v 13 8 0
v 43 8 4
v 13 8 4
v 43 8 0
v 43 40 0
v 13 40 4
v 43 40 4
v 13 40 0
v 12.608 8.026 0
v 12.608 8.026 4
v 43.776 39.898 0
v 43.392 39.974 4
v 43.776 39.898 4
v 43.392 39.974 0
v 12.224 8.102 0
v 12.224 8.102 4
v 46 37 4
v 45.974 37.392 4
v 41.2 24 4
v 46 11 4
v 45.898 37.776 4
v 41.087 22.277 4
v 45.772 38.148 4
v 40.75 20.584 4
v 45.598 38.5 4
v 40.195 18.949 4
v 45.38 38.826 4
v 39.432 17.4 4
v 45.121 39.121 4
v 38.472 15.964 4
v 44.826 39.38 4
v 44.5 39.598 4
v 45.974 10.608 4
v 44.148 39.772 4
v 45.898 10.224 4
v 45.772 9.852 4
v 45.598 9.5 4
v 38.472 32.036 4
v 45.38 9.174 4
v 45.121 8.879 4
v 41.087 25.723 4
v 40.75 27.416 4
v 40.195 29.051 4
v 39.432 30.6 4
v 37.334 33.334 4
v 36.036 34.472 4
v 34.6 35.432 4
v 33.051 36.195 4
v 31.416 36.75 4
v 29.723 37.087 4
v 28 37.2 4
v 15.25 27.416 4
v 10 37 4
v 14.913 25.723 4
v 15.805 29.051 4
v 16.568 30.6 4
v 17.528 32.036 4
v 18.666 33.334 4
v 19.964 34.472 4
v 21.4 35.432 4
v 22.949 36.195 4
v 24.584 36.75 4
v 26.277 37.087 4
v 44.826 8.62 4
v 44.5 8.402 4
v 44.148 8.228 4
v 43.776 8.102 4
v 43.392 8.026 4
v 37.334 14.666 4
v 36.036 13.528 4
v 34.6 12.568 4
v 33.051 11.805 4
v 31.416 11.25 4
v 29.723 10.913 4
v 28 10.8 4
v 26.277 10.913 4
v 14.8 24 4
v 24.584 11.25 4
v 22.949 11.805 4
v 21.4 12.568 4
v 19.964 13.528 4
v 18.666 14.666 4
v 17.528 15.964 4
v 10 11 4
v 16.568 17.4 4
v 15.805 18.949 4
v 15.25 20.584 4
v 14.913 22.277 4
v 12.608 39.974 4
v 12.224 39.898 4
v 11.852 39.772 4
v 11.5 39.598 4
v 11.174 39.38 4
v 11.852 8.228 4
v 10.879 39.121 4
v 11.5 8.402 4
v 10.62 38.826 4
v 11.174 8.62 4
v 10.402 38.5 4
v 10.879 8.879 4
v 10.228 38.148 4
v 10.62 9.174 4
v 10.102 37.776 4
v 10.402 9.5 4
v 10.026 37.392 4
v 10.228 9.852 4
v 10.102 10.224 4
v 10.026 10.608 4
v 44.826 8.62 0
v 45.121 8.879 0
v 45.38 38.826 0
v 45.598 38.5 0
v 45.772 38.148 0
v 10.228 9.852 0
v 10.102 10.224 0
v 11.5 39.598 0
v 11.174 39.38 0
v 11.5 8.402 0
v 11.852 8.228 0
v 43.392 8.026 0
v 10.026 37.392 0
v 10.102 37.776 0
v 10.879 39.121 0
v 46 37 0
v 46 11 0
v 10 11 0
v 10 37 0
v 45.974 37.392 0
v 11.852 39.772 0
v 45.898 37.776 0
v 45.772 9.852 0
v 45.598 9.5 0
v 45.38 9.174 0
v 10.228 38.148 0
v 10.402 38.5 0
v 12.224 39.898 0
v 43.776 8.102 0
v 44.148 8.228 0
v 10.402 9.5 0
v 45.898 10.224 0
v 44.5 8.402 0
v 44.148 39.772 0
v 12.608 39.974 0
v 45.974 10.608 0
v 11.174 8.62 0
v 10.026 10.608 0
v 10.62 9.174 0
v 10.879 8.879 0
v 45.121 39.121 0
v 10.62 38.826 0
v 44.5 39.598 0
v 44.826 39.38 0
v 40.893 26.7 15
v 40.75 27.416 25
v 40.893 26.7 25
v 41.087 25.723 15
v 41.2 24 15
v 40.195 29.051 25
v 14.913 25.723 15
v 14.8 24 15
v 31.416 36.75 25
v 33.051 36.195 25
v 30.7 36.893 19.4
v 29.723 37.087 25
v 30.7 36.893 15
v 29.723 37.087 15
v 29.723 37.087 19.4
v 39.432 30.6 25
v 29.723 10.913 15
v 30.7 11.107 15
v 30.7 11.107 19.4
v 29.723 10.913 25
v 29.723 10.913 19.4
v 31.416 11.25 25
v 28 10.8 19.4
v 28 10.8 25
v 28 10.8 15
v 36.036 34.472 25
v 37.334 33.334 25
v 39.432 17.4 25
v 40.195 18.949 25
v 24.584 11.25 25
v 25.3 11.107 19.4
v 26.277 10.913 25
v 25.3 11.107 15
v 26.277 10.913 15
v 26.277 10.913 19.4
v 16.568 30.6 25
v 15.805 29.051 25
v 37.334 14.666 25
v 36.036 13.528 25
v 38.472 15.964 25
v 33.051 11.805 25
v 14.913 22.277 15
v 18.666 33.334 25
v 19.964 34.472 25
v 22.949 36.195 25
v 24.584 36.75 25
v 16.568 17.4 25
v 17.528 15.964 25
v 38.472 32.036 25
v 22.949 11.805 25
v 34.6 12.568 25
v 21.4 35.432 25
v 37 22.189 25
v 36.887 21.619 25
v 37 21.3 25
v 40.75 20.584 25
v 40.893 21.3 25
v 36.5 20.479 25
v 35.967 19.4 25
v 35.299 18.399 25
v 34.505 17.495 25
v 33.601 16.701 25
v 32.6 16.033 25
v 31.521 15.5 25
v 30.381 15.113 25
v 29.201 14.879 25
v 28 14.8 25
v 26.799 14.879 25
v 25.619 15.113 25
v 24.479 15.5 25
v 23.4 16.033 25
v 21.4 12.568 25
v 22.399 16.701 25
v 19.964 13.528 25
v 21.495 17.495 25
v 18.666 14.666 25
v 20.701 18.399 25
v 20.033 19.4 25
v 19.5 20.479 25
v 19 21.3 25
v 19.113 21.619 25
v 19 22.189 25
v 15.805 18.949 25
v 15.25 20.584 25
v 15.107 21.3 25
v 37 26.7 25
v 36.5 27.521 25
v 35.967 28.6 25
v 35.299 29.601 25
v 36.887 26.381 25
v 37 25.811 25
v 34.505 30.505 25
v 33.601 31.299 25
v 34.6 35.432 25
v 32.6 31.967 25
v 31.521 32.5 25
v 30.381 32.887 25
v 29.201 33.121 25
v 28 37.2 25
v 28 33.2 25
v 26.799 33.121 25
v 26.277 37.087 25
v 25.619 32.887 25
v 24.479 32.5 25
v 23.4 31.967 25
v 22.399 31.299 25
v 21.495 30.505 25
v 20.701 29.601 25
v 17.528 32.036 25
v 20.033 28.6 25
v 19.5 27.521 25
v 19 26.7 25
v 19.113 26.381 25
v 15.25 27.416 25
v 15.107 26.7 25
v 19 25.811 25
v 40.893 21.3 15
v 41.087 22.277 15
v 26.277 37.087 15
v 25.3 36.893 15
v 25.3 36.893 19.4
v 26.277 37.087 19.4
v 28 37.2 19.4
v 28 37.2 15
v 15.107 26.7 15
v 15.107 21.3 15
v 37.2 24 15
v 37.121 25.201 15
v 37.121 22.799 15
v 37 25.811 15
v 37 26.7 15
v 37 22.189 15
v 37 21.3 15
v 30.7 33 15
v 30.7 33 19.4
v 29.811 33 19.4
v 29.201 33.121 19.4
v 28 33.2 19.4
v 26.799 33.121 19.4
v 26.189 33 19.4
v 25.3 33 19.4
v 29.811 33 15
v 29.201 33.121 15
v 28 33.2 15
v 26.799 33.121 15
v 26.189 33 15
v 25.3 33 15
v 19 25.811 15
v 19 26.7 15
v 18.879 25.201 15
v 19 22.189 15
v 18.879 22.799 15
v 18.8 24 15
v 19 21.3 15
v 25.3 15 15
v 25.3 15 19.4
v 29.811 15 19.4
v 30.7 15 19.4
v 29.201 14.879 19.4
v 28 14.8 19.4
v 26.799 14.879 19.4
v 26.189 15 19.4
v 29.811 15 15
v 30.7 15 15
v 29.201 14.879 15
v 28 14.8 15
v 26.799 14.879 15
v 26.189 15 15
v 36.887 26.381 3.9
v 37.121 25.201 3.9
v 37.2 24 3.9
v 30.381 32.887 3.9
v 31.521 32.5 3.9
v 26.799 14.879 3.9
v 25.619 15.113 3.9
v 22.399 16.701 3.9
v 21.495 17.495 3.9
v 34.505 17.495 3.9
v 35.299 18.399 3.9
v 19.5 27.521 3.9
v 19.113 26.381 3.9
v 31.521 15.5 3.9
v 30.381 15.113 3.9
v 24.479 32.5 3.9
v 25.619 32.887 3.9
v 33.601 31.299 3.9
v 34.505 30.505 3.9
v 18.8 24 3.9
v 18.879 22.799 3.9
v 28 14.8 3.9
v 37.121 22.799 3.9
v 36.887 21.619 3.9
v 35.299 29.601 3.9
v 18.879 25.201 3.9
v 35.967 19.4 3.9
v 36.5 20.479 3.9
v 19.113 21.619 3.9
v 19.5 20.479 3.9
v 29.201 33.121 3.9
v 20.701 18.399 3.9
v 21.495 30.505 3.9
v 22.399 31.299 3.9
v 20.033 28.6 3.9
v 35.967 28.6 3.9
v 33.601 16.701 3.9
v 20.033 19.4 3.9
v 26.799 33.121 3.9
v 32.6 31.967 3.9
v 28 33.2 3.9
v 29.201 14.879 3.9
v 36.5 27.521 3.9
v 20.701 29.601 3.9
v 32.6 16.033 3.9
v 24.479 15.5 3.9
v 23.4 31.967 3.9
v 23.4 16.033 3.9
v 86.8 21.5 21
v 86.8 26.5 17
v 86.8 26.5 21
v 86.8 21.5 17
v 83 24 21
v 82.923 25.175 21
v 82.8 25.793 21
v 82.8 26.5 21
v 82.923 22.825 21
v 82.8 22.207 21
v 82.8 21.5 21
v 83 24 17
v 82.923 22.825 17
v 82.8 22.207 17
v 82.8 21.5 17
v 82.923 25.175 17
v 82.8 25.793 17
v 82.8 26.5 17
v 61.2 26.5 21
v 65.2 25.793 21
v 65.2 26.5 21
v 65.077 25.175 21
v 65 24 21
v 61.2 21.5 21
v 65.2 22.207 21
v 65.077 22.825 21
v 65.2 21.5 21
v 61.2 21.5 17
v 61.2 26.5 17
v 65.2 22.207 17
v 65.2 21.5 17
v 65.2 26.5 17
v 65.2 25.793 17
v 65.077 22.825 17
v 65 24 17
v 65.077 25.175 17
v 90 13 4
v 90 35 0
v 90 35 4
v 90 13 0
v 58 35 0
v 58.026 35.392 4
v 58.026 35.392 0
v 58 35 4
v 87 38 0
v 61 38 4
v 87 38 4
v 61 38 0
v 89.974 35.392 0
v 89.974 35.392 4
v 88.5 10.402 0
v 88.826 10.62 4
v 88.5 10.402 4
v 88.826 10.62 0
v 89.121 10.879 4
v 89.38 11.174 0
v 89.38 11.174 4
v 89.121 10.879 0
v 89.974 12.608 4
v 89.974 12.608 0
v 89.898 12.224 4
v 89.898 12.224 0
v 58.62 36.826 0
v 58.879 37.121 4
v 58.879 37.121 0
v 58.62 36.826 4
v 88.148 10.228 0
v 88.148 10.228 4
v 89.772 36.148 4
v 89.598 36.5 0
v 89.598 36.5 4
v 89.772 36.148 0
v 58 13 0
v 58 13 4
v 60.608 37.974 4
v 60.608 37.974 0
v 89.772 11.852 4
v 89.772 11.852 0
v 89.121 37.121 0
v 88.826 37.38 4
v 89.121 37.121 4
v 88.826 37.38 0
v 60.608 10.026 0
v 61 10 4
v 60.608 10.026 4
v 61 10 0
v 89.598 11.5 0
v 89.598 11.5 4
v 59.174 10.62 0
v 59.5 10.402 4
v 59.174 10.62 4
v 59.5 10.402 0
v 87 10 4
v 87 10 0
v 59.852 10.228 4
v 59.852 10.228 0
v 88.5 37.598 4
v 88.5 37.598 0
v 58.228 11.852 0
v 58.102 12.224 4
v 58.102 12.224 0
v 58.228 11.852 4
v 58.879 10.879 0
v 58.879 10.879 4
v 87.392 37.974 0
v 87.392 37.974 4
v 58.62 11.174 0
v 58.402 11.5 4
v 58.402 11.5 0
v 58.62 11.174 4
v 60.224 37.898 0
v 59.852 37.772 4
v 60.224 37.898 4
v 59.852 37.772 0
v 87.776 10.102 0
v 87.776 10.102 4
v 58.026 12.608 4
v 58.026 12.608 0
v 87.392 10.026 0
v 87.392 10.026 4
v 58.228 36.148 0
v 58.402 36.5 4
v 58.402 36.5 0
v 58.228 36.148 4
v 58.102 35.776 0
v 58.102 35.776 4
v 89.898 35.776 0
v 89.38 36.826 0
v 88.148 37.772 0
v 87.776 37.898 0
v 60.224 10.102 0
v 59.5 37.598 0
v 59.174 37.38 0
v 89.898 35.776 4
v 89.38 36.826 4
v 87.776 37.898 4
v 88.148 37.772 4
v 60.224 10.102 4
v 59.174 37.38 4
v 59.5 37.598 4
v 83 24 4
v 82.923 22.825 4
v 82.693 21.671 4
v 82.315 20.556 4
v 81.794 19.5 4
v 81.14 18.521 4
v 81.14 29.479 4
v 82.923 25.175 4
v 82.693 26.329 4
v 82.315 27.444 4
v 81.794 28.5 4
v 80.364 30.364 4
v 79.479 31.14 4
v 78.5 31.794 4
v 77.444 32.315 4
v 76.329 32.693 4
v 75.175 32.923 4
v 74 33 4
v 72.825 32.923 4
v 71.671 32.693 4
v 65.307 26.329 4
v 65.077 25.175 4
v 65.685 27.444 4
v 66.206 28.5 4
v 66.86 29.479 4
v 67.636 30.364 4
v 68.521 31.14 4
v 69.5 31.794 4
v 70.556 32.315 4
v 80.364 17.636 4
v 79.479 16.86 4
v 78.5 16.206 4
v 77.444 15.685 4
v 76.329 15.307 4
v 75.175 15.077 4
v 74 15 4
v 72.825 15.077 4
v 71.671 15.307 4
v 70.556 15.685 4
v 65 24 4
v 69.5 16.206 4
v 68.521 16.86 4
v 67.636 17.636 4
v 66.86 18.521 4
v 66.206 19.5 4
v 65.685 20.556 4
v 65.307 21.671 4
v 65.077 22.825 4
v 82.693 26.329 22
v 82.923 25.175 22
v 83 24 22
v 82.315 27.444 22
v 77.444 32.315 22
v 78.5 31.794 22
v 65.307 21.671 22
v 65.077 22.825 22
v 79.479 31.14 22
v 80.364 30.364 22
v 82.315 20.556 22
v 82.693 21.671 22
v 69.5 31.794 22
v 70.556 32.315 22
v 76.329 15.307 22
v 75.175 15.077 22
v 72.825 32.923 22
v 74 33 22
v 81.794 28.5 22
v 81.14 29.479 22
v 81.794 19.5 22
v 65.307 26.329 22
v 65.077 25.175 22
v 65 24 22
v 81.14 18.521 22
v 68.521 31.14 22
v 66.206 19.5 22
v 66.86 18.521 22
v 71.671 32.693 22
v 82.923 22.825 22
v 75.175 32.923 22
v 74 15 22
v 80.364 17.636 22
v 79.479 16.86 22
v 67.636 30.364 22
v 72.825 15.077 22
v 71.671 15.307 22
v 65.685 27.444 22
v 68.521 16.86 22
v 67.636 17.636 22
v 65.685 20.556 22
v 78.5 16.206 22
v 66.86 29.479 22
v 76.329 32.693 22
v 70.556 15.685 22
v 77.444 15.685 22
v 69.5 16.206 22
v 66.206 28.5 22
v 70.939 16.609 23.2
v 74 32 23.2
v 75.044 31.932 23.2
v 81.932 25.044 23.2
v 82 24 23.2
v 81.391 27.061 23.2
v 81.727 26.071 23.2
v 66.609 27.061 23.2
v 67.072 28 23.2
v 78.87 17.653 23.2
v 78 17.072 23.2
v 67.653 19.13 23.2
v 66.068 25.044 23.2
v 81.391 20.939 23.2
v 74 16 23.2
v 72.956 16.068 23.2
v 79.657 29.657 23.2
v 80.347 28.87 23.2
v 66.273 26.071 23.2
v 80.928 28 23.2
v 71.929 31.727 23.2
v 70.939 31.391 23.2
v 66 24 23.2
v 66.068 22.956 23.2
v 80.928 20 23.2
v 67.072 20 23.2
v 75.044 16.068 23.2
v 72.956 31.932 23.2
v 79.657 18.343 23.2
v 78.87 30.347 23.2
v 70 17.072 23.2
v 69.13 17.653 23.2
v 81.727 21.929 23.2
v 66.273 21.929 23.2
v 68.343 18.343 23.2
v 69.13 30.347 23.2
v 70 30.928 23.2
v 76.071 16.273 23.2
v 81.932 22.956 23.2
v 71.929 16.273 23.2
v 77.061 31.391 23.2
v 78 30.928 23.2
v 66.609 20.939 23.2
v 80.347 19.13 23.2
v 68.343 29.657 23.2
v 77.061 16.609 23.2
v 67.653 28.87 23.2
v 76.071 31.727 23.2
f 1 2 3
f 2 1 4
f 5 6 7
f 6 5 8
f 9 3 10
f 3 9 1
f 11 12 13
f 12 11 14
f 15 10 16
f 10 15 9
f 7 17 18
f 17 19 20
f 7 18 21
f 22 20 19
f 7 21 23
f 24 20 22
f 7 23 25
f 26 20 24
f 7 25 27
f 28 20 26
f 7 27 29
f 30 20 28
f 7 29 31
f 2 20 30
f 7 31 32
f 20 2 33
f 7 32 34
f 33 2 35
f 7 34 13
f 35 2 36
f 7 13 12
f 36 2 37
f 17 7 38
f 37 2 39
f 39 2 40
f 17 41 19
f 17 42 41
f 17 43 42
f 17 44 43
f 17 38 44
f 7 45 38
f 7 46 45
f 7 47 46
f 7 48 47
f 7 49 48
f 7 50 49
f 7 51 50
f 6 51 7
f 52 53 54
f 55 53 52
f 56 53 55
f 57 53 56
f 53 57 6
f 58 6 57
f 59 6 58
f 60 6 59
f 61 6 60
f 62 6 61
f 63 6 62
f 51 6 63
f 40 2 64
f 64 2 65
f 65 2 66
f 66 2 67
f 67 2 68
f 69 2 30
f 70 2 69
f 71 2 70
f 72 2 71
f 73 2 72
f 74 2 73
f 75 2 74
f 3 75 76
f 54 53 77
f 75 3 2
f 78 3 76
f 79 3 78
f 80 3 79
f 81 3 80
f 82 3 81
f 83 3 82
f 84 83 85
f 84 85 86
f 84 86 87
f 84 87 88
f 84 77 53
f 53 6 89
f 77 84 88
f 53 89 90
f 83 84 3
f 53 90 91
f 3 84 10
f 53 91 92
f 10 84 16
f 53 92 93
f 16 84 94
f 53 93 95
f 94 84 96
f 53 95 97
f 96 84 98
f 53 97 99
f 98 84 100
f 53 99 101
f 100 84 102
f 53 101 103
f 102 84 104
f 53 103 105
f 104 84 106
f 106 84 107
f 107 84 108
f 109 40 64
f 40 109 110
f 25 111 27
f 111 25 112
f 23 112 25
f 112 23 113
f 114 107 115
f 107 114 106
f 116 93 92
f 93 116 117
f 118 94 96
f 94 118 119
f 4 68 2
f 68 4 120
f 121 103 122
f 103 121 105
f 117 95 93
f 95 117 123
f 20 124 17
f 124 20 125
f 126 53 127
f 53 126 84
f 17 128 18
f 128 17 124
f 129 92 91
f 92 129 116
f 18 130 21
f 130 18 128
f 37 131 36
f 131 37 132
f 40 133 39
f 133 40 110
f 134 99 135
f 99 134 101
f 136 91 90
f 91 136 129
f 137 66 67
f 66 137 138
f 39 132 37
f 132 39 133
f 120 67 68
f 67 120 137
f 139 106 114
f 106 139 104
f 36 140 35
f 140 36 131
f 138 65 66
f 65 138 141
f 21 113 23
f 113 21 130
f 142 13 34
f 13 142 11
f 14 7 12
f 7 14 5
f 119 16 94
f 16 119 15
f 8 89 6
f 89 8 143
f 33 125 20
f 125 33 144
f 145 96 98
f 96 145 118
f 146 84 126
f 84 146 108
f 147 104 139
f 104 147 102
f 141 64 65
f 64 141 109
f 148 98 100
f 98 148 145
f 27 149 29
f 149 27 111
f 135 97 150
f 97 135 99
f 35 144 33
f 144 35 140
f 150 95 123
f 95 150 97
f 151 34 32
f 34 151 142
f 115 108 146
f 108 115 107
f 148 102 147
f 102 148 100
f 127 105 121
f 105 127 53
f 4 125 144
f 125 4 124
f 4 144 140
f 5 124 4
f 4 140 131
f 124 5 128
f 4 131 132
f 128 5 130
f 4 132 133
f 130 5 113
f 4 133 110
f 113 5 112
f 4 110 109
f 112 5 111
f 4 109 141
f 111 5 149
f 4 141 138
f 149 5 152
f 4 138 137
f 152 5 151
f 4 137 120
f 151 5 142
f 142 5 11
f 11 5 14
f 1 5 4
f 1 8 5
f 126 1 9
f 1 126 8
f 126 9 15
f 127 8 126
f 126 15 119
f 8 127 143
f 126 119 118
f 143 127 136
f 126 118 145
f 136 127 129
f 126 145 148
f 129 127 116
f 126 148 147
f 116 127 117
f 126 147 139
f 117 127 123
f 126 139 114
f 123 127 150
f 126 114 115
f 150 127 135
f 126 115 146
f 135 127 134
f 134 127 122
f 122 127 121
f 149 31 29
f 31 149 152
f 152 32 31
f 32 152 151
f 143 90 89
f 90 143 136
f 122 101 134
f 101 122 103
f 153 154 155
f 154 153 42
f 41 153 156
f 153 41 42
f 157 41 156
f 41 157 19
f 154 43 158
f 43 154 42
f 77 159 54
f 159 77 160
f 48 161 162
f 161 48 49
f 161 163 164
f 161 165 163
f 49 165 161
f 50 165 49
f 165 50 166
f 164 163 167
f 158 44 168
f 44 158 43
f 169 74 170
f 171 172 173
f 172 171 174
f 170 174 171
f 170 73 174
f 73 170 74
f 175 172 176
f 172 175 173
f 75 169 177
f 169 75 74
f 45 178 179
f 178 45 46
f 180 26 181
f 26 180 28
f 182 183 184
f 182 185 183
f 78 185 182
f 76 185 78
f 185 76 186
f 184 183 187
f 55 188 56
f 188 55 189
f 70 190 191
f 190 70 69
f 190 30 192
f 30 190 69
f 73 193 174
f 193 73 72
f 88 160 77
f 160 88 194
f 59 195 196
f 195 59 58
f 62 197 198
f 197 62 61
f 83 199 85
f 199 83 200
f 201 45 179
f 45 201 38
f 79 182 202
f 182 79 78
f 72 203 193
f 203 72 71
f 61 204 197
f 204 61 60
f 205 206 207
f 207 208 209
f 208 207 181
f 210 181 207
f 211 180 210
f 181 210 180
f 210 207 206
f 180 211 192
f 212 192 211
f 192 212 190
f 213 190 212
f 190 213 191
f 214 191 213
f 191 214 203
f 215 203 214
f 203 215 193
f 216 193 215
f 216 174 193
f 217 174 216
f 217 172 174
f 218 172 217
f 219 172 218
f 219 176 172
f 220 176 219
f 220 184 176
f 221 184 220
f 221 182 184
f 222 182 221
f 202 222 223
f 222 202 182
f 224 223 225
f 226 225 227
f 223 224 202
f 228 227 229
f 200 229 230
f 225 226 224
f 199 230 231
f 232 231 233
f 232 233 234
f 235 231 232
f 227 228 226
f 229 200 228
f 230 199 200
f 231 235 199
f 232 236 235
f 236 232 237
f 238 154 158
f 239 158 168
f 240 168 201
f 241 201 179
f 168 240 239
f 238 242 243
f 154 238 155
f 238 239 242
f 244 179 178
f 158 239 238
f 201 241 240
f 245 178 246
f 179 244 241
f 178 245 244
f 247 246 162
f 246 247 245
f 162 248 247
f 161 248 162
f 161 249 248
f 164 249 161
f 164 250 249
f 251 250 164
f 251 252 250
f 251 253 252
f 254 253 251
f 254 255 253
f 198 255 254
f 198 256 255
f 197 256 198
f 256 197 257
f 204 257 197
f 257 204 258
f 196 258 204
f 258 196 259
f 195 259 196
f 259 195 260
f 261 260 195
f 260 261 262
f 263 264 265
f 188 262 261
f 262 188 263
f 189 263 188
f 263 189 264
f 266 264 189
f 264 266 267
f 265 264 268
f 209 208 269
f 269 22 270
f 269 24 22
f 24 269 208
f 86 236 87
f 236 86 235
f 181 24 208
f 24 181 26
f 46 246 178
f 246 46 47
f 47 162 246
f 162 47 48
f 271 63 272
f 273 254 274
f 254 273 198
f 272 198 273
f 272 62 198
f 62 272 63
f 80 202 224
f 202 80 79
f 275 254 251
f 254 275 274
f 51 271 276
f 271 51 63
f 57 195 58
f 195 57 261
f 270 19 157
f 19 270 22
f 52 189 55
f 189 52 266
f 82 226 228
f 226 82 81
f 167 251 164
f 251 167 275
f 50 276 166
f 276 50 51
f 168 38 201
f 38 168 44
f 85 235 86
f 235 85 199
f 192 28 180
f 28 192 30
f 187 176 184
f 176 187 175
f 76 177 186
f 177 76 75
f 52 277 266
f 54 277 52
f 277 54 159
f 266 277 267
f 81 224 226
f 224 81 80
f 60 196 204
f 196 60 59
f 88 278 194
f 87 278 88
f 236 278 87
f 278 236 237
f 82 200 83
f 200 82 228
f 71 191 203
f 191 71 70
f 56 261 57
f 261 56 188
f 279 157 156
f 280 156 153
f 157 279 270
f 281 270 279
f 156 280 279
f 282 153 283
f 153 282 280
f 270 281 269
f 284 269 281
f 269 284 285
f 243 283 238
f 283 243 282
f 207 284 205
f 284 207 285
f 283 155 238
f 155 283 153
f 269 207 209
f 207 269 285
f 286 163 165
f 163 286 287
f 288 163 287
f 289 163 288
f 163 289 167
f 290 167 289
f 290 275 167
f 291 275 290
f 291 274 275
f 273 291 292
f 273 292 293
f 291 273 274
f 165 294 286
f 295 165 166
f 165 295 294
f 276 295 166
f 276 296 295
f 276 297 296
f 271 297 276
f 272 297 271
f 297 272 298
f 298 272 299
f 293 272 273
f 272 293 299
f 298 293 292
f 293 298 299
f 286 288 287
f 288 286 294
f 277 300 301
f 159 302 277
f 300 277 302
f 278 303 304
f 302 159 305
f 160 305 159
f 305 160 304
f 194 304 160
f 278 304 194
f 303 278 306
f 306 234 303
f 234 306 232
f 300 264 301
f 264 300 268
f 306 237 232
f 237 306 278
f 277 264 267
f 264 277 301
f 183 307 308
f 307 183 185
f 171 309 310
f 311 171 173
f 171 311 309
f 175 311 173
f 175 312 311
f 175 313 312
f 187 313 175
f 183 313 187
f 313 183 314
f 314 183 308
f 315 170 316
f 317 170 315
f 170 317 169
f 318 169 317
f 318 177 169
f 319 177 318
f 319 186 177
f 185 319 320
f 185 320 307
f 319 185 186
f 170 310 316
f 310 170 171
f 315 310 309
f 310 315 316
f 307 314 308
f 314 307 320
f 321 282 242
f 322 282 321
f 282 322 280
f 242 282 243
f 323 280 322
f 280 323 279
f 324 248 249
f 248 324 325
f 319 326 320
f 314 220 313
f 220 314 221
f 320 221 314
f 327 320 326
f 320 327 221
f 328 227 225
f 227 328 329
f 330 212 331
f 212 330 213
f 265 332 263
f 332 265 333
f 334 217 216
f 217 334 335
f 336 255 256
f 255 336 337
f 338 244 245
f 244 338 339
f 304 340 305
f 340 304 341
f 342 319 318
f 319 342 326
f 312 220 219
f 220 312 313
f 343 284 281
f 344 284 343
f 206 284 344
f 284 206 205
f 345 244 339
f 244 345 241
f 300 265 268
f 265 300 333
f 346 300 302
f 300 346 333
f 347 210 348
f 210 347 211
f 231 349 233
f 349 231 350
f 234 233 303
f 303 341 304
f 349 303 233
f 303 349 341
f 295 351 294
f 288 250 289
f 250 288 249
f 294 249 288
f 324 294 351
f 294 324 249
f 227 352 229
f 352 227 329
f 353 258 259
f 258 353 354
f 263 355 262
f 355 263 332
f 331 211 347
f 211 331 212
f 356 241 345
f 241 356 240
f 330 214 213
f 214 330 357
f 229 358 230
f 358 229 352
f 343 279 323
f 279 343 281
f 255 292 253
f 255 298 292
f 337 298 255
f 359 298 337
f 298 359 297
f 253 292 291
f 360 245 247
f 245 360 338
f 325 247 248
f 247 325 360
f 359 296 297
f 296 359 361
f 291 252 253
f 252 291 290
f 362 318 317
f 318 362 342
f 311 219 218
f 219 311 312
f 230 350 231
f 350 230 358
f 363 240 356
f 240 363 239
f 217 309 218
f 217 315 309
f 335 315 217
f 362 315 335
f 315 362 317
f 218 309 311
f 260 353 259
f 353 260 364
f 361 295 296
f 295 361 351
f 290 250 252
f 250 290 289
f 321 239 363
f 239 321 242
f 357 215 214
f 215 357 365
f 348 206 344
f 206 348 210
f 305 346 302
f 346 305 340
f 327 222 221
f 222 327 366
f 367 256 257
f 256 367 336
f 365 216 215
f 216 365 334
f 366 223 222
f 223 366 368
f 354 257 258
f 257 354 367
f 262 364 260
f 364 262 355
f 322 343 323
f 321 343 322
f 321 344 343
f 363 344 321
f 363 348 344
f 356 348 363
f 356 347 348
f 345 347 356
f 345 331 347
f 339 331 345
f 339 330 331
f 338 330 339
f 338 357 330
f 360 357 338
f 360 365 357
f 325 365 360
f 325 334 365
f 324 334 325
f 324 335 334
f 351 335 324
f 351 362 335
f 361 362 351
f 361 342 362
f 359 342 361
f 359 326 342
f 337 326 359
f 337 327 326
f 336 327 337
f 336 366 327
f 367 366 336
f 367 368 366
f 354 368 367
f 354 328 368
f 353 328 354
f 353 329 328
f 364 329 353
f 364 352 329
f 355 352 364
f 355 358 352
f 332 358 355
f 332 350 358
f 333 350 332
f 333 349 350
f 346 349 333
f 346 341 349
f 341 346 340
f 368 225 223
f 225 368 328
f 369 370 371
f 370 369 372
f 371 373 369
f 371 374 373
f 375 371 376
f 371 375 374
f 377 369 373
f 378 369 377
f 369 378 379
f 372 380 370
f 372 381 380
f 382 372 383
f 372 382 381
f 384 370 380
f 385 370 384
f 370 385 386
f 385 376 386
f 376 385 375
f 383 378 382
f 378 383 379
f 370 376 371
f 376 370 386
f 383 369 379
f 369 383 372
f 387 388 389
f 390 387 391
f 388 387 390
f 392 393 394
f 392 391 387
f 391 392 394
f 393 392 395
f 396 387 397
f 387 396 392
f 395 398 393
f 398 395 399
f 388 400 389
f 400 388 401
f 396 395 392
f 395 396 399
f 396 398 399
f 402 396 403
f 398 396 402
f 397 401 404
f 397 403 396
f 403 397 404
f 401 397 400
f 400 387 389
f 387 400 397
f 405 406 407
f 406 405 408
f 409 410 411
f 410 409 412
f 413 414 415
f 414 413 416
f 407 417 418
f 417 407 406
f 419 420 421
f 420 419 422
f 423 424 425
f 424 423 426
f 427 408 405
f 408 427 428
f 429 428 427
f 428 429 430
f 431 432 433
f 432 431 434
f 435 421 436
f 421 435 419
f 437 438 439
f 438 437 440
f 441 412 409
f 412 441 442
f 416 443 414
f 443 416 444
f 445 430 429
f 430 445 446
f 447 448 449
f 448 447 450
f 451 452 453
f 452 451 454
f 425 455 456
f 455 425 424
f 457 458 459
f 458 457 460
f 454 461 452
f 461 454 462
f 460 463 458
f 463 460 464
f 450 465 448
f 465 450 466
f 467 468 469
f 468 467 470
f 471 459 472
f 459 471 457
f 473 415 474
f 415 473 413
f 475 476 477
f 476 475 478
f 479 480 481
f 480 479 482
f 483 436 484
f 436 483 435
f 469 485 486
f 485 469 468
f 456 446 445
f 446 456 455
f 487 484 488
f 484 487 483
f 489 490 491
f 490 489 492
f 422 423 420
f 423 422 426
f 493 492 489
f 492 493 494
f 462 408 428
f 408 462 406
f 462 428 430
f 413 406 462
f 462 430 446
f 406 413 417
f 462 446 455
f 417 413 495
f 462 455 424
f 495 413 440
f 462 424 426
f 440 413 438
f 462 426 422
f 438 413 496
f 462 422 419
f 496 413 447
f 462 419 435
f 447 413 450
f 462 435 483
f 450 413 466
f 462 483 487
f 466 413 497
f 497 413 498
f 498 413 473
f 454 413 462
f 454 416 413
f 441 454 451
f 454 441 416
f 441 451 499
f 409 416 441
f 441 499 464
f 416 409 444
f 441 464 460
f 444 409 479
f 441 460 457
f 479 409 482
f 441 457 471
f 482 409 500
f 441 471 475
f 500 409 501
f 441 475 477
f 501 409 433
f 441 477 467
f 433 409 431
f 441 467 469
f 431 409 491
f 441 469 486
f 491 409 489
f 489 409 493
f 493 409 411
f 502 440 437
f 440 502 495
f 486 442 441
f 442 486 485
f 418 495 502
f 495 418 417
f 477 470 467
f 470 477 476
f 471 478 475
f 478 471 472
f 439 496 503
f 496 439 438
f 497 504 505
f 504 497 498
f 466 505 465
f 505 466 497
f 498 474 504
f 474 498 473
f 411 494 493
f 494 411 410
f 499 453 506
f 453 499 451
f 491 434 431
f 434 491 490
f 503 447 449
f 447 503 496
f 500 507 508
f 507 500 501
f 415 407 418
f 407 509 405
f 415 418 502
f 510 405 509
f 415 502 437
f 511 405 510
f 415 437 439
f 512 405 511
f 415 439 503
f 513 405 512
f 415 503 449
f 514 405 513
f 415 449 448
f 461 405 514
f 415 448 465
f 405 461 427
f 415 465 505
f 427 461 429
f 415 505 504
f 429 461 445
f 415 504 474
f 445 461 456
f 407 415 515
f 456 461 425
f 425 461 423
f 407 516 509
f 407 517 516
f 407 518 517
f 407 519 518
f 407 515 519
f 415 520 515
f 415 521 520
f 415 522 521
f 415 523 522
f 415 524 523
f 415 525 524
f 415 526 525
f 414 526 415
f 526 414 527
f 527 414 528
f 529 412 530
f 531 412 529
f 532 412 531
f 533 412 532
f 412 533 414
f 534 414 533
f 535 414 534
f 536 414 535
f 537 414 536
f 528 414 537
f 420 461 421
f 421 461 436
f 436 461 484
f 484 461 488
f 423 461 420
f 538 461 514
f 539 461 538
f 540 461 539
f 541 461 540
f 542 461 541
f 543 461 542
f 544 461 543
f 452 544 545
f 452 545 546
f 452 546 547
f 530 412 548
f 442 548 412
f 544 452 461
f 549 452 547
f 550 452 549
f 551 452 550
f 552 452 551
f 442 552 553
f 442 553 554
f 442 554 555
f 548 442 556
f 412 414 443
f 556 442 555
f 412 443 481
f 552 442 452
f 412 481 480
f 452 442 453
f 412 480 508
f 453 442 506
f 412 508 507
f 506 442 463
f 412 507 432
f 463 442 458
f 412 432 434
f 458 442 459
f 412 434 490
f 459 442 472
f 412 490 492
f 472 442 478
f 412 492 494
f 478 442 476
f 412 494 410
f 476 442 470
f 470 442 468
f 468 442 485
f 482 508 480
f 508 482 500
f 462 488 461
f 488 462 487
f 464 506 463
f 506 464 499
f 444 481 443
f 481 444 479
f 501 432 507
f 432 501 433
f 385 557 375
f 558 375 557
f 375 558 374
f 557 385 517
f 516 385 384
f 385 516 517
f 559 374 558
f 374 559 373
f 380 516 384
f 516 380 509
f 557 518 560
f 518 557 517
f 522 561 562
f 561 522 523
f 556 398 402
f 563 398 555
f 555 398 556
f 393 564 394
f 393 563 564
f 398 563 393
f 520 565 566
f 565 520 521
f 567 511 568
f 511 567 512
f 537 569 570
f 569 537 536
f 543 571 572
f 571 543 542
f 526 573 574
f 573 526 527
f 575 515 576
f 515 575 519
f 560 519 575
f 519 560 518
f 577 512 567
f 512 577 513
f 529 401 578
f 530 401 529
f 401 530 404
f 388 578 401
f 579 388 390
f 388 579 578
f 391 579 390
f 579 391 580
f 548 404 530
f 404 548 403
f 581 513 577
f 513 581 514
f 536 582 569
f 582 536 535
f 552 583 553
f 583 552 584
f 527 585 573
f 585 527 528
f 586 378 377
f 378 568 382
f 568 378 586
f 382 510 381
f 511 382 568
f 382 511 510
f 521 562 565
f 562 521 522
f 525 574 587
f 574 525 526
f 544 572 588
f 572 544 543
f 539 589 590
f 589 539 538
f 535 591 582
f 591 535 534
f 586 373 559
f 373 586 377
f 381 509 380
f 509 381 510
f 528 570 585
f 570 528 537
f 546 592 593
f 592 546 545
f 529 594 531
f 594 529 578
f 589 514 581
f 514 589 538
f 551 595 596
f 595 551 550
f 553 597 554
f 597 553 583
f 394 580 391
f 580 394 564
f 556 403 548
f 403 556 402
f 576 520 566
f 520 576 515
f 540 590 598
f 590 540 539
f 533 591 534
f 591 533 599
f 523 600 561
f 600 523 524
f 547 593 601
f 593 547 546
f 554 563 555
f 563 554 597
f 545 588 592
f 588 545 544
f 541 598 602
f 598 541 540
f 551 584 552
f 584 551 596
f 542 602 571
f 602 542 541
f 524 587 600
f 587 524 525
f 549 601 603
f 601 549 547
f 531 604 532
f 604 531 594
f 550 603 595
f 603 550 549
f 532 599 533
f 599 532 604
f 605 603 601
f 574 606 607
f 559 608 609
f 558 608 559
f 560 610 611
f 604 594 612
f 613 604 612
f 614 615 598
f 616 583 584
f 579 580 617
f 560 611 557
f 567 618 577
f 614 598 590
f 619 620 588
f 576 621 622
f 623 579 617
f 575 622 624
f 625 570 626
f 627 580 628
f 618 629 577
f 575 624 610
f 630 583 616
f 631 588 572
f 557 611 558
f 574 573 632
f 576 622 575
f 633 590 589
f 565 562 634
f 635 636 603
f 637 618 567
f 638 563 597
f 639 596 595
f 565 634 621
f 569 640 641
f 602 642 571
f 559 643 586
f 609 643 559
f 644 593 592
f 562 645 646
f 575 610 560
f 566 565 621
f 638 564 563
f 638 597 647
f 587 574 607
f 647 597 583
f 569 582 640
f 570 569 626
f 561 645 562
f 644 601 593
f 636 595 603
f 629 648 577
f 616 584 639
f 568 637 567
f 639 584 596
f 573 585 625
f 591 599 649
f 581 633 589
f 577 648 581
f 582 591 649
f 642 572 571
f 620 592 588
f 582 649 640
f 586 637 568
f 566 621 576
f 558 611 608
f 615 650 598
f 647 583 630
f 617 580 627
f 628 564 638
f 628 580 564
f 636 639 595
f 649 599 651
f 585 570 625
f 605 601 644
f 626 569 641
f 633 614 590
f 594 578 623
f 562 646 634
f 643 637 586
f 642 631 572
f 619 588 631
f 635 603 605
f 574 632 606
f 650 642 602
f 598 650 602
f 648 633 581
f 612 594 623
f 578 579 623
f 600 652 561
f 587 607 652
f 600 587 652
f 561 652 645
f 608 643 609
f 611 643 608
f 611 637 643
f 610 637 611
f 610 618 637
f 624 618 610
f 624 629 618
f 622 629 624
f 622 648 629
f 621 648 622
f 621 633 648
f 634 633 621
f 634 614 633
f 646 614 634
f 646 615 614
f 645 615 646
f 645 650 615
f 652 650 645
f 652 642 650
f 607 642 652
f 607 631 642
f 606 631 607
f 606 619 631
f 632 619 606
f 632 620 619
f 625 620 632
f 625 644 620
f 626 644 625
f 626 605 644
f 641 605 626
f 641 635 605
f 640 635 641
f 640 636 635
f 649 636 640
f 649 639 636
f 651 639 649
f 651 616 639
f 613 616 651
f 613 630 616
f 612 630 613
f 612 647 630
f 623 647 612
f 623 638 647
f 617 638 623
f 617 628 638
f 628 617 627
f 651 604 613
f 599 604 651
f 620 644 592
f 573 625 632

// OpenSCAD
/*
Sample 077: Bajonett-Vierteldrehverschluss — 0,20 mm
Generated from the FDM Mechanical Sample Library.
Units: millimetres.

Override examples:
  openscad -o custom.stl -D 'view="plate"' -D 'render_fn=64' model.scad
  openscad -o preview.png -D 'view="assembly"' model.scad
*/
use <../../../library/fdm_mechanisms.scad>

render_fn = is_undef(render_fn) ? 48 : render_fn;
view = is_undef(view) ? "plate" : view;
$fn = render_fn;

sample_bayonet(
    view=view,
    core_d=18,
    clearance=0.2,
    lug_w=5
);
